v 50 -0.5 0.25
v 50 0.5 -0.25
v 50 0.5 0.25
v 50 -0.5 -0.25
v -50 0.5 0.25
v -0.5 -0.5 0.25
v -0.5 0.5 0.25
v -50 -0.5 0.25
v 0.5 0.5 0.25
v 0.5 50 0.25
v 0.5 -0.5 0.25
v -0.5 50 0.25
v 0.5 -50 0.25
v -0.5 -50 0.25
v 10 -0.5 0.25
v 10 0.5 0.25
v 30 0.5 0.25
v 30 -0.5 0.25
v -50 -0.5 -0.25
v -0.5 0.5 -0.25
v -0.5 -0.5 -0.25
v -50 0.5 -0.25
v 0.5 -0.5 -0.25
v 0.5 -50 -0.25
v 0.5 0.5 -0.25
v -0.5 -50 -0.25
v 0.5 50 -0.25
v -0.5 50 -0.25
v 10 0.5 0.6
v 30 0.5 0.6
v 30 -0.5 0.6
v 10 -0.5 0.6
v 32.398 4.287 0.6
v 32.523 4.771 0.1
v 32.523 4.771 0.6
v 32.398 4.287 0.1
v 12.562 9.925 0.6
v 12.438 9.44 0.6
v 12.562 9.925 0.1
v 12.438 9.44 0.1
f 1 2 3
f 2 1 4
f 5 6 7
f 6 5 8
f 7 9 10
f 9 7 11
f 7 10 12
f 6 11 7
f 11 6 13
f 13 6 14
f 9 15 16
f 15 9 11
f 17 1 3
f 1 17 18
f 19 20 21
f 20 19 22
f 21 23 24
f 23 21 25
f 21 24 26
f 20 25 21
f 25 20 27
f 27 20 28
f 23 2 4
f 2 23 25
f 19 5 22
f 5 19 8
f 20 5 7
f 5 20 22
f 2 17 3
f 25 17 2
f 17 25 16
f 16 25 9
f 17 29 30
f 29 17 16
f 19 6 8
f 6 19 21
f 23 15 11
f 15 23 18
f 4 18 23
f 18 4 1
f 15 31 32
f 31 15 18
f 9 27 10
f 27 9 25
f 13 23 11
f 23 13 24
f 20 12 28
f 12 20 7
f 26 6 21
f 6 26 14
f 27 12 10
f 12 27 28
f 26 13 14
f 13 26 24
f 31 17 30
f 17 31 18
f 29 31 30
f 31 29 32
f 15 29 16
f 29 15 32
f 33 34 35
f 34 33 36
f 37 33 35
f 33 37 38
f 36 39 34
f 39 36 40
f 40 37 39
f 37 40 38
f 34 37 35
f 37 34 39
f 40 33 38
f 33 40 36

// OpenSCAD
case = 4;
resolution = 30;
centered = true;
UPOUT = 0; UPIN = 1; LEOUT = 2; LEIN = 3; REOUT = 4; REIN = 5; DOOUT = 6; DOIN = 7;
//   poly=[
// //round upside out 0
//     [
//     each(roundPoint2D(pt=[0,10],rad=10, res = resolution,left = true,a0 = -90, a1 = 90, center = centered)), 
//     [-10,0],
//     [10,0],
//     ],
// //round upside in 1
//     [
//     each(roundPoint2D(pt=[0,10],rad=5, res = resolution,left = false,a0 = 90, a1 = 270, center = centered)), 
//     [-10,0],
//     [10,0],
//     ],
// //round left out 2
//     [
//     each(roundPoint2D(pt=[-10,00],rad=5, res = resolution,left = false,a0 = 180, a1 = 360, center = centered)), 
//     [0,0],
//     ],
// //round left in 3
//     [
//     each(roundPoint2D(pt=[-10,02],rad=5, res = resolution,left = false,a0 = 0, a1 = 180, center = centered)), 
//     [0,-10],
//     [0,10],
//     ],
// //round right out 4
//     [
//     each(roundPoint2D(pt=[10,00],rad=5, res = resolution,left = false,a0 = -90, a1 = 180, center = centered)), 
//     [0,0],
//     ],
//     ];
//Test cases
//echo("printing ",poly[case]);
//    color("red")
//    polygon(poly[case]);


//example on how to use the iner tangent angle to connect 2 circles



  //echo("w: ", normWinkel(w=490));

  //echo("höhensatz: ^: 1", hs_euklid(mode = "hp", h=70.12, p= 1.1));
  //Test of outer tangent
  k1=  [10,0,10];
  k2=  [30*cos($t*360),30*sin($t*360),5];
  ot = outerTangente(c1 = [k1[0],k1[1]], r1=k1[2], c2=[k2[0],k2[1]], r2=k2[2]);
  echo("\nÄussere Tangent: :k1", ot);
 color("black")cube([100,1,.5], center = true);  //xachse
 color("black")cube([1,100,.5], center = true);  //yachse
 color("green")translate([k1[0],k1[1],0]) circle(r=k1[2]);
 
 color("yellow")translate([k2[0],k2[1],0]) circle(r=k2[2]);
 color("magenta")translate([60*cos($t*360),60*sin($t*360),0]) circle(r=k2[2]);
 color("brown")translate([k1[0],k1[1],0]) rotate([0,0,ot[3]]) translate([0,-0.5,0.1])cube([ot[0],1,0.5], center = false);//center center
 mydelta = -ot[1]+ot[2];
 deltas = mydelta;
  //echo("delta", mydelta);
 //color("magenta") translate([k1[0]+k1[2]*sin(-ot[1]),k1[1]+k1[2]*cos(ot[1]),0]) rotate([0,0,ot[1]])translate([0,-0.5,0.1])cube([ot[4],1,0.5], center = false);//center tenter

 color("red")
 translate([k1[0]+k1[2]*sin(ot[5]),k1[1]+k1[2]*cos(ot[5]),0]) rotate([0,0,ot[6]])translate([0,-0.25,0.1])
  cube([ot[4],.5,0.5], center = false);//center tenter
  //cube([2,.5,0.5], center = false);//center tenter

  //Test of inner tangent
cll = innerTangente(c1 = [k1[0],k1[1]], r1=k1[2], c2=[k2[0],k2[1]], r2=k2[2]);
circleround = [
  //[0,0],
  //each(roundPoint2D(pt=[20,20],rad=10, res = 160,left = false,a0 = 0, a1 = 90, center = true)), 
  each(roundPoint2D(pt=[-20,20],rad=10, res = 160,left = false,a0 = -90-cll[3], a1 = 90-cll[3], center = true)), 
  each(roundPoint2D(pt=[30,-5],rad=5, res = 160,left = false,a0 = 90-cll[3], a1 = 270-cll[3], center = false)), 
  //[-10,0],
  //[10,0],
  ];
  //color("red")
  //polygon(circleround);
  //translate([0,0,-1])square(40, center = true);

  //common part of tangent test
  // cube([100,1,5], center = true);  //xachse
  // cube([1,100,5], center = true);  //yachse
  // translate([k1[0],k1[1],0]) circle(r=k1[2]);
  // translate([k2[0],k2[1],0]) circle(r=k2[2]);
  // color("green")
  // translate([k1[0]+k1[2]*cos(cll[5]),k1[1]-k1[2]*cos(cll[5]),0]) rotate([0,0,cll[5]+90])translate([0,-.5,-2.5])cube([cll[0],1,5], center = false);
  //
  //point = poly[case][resolution];
  a1 = 90;
  a0 = -90;
  rad = 10;
  halw = (a0+a1)/2;
  //zentrum = [point[0]+rad*sin(halw), point[1]+rad*cos(halw)];
  //echo("zentrum = ",zentrum,sin(a1),sin(a0));
  /**
   * round up for start point pt, around rad = radius turn right or left, starting from angle lalpha0 = a0 to alpha1
   * default turn direction is clockwise, starting at vertical up (90°)
   */
function roundPoint2D(pt,rad, res = 3,left = false,a0 = 0, a1 = 180, center = false, min=[-1000,-1000]) =
  [
    //let (dw = a1-a0,halw = (a0+a1)/2, qx = (pt[0]<0)?-1:1, qy = (pt[0]<0)?-1:1,step = (a1 - a0)/(res-1),zentrum = (center)?[pt[0]-rad*sin(halw), pt[1]-rad*cos(halw)]:pt)
let (
    dw = a1-a0,
    normDiff = (left==false)? (normWinkel(a1)-normWinkel(a0)):(normWinkel(a0)-normWinkel(a1)),
    normDw = (normDiff<0)? 360+normDiff:normDiff,
    halw = (a0+a1)/2, 
    qx = (pt[0]<0)?-1:1, 
    qy = (pt[0]<0)?-1:1,
    step = (a1 - a0)/(res-1),
    rg = rad/sin(45),
    effr = (normDw <=90)? rg: rad,
    zentrum = (center)?[pt[0]-effr*sin(halw), pt[1]-effr*cos(halw)]:pt
    //echo("nomDW",normDw,"nD", normDiff,effr,zentrum, a0,a1,left)
  )
for(w = [((left)? a1:a0):((left)? -1:1)*step:((left)? a0:a1)])
  if(len(min) == 2 &&(zentrum[0]+rad*sin(w) >min[0] && zentrum[1]+rad*cos(w)>min[1]))[zentrum[0]+rad*sin(w), zentrum[1]+rad*cos(w)]
  ];

  /** 
    https://math.stackexchange.com/questions/719758/inner-tangent-between-two-circles-formula
    compute the outer tangent of 2 circles, so as to be able to know how to smooth out 2 concurrent curves
    c1 need ot be the bigger pone
    M1M2 distance of the centers
    delta the angle of the radius of circle 1to the tangent
    alpha 

    returns:
0: the distance of the centers
1: angle between hypotenuse and inner circle in big circle radius
2: angle between hypotenuse and tangent at small circle radius
3: alpha
4: length of tangent
    */
function outerTangente(c1 = [0,0], r1=10, c2=[20,20], r2=5) =
assert(r1>r2)
  let(
      x1 = c1[0], x2 = c2[0],y1 = c1[1], y2 = c2[1],
      M1M2= sqrt((x2-x1)^2+(y2-y1)^2), //distance between the circles, the hypotenuse
      phi =  acos(abs(x2-x1)/M1M2), //angle between hypotenuse and inner circle in big circle radius
      beta =  asin(abs(r1-r2)/M1M2), //angle between hypotenuse and tangent at small circle radius
      //theta = asin(c2[0]-c1[0]/M1M2), //angle between hypo and y axis,
      dx = x2-x1, //delta x for quadrant computing,
      dy = y2-y1, //delta y for quadrant computing,
      alpha = (dx >=0  && dy  >= 0 )? phi //first quadrant
             :(dx <0  && dy  >= 0 )?180-phi //2. quadrant
             :(dx <0  && dy  < 0 )?180+ phi //3. quadrant
             :360-phi,                         //4. quadrant  
      delta = (dx >=0)?-alpha+beta:
                -alpha-beta, //angle between hypo and y axis,
      deltas = (dx >=0)?alpha-beta:
               alpha-beta, //angle between hypo and y axis,
      T1T2 = sqrt(M1M2^2+(r1-r2)^2)
     )
echo("t",$t,"dr",(x2-x1)," phi",phi, " delta", delta, "strich", deltas)
     //TODO ensure that r1 > r2!!!
  [ //0    1    2    3      4     5     6
    M1M2, phi, beta,alpha, T1T2,delta,deltas
  ];
  /** 
    compute the inner tangent of 2 circles, so as to be able to know how to smooth out 2 concurrent curves
    M1M2 distance of the centers
    delta the angle of the radius of circle 1to the tangent
    alpha 
    */
function innerTangente(c1 = [0,0], r1=10, c2=[20,20], r2=5) =
  let(
      M1M2= sqrt((c2[0]-c1[0])^2+(c2[1]-c1[1])^2),
      short = r1+r2,
      phi = asin(short/M1M2)-90,
      phiabs = atan2(c2[1]-c1[1], c2[0]-c1[0]) + phi,
      delta = atan((c2[1]-c1[1])/(c2[0]-c1[0])),
      alpha = asin((r1+r2)/M1M2)
     )
  [//0      1     2        3       4    5
    M1M2, delta, alpha, 90-alpha, phi, phiabs
  ];

  /**
    convert the angle to somewhat usable
    */
function normWinkel(w=0)=
  let(topositiv = (w<0)? 360+(w%360): w%360) topositiv;

 /** 
   Höhensatz von  Euklid
   Halbsehne h = geometrisches mittel zwischen den Radiusabschnitten p und q => sqr(pq)
   h= halbe Sehne
   p radius zum Kreis
   q radius zum Zentrum
   r = p+q, kreisradius
   mode ["radius","hp", "3pkt", "2pkt"]  return radius or hypotenuse , 3pkt give 3 points return radius and center
                                                2pkt give endpoints and rounding returns radius

   */
function  hs_euklid(mode = "radius",h=-1, p = -1, q = -1, r = -1, pkt=[[-1,1],[0,0],[-1,-1]])=
(mode == "radius")? p+q
:(mode == "hp")? p+h^2/p
:(mode == "3pkt")? let(
    s=sqr((pkt[0][0]-pkt[2][0])^2+(pkt[0][1]-pkt[2][1])^2),
    h=s/2,
    xm=sqr((pkt[0][0]-pkt[1][0])^2+(pkt[0][1]-pkt[1][1])^2),
    p=sqr(h^2-xm),
    alpha = acos(h/xm)
    )
  [ p+h^2/p] 
:(mode == "2pkt")? let(
    s=sqrt((pkt[0][0]-pkt[1][0])^2+(pkt[0][1]-pkt[1][1])^2),
    h=s/2,
    q=pkt[2],
    r=pkt[2]+q,
    alpha = atan((pkt[0][1]-pkt[1][1])/(pkt[0][0]-pkt[1][0]))
    )
  [ r, [pkt[0][0]+h+q*sin(alpha), q*cos(alpha)]] 
:sqrt(p*q); //default return h

/*
   funktion ermittelt die Schnittpunkte eines Kreises mit einer geraden
   kreis = mittelpunkt, radius, linie = steigung, const
   */
function grade_kreis_schnitt(kreis = [[0,0], 10], linie = [10,0])=
let(
    a = 1+linie[0]^2,
    b  = 2*linie[0]*(linie[1]-kreis[0][1])-2*kreis[0][0],
    c = kreis[0][0]^2+(linie[1]-kreis[0][1])^2-kreis[1]^2,
    discr  = b^2-4*a*c,
    sol = (discr>0)?2:(discr==0)?1:-1,
    s1 = (sol>0)?(-b+sqrt(discr))/(2*a):-1,
    s2 = (sol>0)?(-b-sqrt(discr))/(2*a):-1
    )
[
[s1,linie[0]*s1+linie[1]],
[s2,linie[0]*s2+linie[1]],
  sol
];
